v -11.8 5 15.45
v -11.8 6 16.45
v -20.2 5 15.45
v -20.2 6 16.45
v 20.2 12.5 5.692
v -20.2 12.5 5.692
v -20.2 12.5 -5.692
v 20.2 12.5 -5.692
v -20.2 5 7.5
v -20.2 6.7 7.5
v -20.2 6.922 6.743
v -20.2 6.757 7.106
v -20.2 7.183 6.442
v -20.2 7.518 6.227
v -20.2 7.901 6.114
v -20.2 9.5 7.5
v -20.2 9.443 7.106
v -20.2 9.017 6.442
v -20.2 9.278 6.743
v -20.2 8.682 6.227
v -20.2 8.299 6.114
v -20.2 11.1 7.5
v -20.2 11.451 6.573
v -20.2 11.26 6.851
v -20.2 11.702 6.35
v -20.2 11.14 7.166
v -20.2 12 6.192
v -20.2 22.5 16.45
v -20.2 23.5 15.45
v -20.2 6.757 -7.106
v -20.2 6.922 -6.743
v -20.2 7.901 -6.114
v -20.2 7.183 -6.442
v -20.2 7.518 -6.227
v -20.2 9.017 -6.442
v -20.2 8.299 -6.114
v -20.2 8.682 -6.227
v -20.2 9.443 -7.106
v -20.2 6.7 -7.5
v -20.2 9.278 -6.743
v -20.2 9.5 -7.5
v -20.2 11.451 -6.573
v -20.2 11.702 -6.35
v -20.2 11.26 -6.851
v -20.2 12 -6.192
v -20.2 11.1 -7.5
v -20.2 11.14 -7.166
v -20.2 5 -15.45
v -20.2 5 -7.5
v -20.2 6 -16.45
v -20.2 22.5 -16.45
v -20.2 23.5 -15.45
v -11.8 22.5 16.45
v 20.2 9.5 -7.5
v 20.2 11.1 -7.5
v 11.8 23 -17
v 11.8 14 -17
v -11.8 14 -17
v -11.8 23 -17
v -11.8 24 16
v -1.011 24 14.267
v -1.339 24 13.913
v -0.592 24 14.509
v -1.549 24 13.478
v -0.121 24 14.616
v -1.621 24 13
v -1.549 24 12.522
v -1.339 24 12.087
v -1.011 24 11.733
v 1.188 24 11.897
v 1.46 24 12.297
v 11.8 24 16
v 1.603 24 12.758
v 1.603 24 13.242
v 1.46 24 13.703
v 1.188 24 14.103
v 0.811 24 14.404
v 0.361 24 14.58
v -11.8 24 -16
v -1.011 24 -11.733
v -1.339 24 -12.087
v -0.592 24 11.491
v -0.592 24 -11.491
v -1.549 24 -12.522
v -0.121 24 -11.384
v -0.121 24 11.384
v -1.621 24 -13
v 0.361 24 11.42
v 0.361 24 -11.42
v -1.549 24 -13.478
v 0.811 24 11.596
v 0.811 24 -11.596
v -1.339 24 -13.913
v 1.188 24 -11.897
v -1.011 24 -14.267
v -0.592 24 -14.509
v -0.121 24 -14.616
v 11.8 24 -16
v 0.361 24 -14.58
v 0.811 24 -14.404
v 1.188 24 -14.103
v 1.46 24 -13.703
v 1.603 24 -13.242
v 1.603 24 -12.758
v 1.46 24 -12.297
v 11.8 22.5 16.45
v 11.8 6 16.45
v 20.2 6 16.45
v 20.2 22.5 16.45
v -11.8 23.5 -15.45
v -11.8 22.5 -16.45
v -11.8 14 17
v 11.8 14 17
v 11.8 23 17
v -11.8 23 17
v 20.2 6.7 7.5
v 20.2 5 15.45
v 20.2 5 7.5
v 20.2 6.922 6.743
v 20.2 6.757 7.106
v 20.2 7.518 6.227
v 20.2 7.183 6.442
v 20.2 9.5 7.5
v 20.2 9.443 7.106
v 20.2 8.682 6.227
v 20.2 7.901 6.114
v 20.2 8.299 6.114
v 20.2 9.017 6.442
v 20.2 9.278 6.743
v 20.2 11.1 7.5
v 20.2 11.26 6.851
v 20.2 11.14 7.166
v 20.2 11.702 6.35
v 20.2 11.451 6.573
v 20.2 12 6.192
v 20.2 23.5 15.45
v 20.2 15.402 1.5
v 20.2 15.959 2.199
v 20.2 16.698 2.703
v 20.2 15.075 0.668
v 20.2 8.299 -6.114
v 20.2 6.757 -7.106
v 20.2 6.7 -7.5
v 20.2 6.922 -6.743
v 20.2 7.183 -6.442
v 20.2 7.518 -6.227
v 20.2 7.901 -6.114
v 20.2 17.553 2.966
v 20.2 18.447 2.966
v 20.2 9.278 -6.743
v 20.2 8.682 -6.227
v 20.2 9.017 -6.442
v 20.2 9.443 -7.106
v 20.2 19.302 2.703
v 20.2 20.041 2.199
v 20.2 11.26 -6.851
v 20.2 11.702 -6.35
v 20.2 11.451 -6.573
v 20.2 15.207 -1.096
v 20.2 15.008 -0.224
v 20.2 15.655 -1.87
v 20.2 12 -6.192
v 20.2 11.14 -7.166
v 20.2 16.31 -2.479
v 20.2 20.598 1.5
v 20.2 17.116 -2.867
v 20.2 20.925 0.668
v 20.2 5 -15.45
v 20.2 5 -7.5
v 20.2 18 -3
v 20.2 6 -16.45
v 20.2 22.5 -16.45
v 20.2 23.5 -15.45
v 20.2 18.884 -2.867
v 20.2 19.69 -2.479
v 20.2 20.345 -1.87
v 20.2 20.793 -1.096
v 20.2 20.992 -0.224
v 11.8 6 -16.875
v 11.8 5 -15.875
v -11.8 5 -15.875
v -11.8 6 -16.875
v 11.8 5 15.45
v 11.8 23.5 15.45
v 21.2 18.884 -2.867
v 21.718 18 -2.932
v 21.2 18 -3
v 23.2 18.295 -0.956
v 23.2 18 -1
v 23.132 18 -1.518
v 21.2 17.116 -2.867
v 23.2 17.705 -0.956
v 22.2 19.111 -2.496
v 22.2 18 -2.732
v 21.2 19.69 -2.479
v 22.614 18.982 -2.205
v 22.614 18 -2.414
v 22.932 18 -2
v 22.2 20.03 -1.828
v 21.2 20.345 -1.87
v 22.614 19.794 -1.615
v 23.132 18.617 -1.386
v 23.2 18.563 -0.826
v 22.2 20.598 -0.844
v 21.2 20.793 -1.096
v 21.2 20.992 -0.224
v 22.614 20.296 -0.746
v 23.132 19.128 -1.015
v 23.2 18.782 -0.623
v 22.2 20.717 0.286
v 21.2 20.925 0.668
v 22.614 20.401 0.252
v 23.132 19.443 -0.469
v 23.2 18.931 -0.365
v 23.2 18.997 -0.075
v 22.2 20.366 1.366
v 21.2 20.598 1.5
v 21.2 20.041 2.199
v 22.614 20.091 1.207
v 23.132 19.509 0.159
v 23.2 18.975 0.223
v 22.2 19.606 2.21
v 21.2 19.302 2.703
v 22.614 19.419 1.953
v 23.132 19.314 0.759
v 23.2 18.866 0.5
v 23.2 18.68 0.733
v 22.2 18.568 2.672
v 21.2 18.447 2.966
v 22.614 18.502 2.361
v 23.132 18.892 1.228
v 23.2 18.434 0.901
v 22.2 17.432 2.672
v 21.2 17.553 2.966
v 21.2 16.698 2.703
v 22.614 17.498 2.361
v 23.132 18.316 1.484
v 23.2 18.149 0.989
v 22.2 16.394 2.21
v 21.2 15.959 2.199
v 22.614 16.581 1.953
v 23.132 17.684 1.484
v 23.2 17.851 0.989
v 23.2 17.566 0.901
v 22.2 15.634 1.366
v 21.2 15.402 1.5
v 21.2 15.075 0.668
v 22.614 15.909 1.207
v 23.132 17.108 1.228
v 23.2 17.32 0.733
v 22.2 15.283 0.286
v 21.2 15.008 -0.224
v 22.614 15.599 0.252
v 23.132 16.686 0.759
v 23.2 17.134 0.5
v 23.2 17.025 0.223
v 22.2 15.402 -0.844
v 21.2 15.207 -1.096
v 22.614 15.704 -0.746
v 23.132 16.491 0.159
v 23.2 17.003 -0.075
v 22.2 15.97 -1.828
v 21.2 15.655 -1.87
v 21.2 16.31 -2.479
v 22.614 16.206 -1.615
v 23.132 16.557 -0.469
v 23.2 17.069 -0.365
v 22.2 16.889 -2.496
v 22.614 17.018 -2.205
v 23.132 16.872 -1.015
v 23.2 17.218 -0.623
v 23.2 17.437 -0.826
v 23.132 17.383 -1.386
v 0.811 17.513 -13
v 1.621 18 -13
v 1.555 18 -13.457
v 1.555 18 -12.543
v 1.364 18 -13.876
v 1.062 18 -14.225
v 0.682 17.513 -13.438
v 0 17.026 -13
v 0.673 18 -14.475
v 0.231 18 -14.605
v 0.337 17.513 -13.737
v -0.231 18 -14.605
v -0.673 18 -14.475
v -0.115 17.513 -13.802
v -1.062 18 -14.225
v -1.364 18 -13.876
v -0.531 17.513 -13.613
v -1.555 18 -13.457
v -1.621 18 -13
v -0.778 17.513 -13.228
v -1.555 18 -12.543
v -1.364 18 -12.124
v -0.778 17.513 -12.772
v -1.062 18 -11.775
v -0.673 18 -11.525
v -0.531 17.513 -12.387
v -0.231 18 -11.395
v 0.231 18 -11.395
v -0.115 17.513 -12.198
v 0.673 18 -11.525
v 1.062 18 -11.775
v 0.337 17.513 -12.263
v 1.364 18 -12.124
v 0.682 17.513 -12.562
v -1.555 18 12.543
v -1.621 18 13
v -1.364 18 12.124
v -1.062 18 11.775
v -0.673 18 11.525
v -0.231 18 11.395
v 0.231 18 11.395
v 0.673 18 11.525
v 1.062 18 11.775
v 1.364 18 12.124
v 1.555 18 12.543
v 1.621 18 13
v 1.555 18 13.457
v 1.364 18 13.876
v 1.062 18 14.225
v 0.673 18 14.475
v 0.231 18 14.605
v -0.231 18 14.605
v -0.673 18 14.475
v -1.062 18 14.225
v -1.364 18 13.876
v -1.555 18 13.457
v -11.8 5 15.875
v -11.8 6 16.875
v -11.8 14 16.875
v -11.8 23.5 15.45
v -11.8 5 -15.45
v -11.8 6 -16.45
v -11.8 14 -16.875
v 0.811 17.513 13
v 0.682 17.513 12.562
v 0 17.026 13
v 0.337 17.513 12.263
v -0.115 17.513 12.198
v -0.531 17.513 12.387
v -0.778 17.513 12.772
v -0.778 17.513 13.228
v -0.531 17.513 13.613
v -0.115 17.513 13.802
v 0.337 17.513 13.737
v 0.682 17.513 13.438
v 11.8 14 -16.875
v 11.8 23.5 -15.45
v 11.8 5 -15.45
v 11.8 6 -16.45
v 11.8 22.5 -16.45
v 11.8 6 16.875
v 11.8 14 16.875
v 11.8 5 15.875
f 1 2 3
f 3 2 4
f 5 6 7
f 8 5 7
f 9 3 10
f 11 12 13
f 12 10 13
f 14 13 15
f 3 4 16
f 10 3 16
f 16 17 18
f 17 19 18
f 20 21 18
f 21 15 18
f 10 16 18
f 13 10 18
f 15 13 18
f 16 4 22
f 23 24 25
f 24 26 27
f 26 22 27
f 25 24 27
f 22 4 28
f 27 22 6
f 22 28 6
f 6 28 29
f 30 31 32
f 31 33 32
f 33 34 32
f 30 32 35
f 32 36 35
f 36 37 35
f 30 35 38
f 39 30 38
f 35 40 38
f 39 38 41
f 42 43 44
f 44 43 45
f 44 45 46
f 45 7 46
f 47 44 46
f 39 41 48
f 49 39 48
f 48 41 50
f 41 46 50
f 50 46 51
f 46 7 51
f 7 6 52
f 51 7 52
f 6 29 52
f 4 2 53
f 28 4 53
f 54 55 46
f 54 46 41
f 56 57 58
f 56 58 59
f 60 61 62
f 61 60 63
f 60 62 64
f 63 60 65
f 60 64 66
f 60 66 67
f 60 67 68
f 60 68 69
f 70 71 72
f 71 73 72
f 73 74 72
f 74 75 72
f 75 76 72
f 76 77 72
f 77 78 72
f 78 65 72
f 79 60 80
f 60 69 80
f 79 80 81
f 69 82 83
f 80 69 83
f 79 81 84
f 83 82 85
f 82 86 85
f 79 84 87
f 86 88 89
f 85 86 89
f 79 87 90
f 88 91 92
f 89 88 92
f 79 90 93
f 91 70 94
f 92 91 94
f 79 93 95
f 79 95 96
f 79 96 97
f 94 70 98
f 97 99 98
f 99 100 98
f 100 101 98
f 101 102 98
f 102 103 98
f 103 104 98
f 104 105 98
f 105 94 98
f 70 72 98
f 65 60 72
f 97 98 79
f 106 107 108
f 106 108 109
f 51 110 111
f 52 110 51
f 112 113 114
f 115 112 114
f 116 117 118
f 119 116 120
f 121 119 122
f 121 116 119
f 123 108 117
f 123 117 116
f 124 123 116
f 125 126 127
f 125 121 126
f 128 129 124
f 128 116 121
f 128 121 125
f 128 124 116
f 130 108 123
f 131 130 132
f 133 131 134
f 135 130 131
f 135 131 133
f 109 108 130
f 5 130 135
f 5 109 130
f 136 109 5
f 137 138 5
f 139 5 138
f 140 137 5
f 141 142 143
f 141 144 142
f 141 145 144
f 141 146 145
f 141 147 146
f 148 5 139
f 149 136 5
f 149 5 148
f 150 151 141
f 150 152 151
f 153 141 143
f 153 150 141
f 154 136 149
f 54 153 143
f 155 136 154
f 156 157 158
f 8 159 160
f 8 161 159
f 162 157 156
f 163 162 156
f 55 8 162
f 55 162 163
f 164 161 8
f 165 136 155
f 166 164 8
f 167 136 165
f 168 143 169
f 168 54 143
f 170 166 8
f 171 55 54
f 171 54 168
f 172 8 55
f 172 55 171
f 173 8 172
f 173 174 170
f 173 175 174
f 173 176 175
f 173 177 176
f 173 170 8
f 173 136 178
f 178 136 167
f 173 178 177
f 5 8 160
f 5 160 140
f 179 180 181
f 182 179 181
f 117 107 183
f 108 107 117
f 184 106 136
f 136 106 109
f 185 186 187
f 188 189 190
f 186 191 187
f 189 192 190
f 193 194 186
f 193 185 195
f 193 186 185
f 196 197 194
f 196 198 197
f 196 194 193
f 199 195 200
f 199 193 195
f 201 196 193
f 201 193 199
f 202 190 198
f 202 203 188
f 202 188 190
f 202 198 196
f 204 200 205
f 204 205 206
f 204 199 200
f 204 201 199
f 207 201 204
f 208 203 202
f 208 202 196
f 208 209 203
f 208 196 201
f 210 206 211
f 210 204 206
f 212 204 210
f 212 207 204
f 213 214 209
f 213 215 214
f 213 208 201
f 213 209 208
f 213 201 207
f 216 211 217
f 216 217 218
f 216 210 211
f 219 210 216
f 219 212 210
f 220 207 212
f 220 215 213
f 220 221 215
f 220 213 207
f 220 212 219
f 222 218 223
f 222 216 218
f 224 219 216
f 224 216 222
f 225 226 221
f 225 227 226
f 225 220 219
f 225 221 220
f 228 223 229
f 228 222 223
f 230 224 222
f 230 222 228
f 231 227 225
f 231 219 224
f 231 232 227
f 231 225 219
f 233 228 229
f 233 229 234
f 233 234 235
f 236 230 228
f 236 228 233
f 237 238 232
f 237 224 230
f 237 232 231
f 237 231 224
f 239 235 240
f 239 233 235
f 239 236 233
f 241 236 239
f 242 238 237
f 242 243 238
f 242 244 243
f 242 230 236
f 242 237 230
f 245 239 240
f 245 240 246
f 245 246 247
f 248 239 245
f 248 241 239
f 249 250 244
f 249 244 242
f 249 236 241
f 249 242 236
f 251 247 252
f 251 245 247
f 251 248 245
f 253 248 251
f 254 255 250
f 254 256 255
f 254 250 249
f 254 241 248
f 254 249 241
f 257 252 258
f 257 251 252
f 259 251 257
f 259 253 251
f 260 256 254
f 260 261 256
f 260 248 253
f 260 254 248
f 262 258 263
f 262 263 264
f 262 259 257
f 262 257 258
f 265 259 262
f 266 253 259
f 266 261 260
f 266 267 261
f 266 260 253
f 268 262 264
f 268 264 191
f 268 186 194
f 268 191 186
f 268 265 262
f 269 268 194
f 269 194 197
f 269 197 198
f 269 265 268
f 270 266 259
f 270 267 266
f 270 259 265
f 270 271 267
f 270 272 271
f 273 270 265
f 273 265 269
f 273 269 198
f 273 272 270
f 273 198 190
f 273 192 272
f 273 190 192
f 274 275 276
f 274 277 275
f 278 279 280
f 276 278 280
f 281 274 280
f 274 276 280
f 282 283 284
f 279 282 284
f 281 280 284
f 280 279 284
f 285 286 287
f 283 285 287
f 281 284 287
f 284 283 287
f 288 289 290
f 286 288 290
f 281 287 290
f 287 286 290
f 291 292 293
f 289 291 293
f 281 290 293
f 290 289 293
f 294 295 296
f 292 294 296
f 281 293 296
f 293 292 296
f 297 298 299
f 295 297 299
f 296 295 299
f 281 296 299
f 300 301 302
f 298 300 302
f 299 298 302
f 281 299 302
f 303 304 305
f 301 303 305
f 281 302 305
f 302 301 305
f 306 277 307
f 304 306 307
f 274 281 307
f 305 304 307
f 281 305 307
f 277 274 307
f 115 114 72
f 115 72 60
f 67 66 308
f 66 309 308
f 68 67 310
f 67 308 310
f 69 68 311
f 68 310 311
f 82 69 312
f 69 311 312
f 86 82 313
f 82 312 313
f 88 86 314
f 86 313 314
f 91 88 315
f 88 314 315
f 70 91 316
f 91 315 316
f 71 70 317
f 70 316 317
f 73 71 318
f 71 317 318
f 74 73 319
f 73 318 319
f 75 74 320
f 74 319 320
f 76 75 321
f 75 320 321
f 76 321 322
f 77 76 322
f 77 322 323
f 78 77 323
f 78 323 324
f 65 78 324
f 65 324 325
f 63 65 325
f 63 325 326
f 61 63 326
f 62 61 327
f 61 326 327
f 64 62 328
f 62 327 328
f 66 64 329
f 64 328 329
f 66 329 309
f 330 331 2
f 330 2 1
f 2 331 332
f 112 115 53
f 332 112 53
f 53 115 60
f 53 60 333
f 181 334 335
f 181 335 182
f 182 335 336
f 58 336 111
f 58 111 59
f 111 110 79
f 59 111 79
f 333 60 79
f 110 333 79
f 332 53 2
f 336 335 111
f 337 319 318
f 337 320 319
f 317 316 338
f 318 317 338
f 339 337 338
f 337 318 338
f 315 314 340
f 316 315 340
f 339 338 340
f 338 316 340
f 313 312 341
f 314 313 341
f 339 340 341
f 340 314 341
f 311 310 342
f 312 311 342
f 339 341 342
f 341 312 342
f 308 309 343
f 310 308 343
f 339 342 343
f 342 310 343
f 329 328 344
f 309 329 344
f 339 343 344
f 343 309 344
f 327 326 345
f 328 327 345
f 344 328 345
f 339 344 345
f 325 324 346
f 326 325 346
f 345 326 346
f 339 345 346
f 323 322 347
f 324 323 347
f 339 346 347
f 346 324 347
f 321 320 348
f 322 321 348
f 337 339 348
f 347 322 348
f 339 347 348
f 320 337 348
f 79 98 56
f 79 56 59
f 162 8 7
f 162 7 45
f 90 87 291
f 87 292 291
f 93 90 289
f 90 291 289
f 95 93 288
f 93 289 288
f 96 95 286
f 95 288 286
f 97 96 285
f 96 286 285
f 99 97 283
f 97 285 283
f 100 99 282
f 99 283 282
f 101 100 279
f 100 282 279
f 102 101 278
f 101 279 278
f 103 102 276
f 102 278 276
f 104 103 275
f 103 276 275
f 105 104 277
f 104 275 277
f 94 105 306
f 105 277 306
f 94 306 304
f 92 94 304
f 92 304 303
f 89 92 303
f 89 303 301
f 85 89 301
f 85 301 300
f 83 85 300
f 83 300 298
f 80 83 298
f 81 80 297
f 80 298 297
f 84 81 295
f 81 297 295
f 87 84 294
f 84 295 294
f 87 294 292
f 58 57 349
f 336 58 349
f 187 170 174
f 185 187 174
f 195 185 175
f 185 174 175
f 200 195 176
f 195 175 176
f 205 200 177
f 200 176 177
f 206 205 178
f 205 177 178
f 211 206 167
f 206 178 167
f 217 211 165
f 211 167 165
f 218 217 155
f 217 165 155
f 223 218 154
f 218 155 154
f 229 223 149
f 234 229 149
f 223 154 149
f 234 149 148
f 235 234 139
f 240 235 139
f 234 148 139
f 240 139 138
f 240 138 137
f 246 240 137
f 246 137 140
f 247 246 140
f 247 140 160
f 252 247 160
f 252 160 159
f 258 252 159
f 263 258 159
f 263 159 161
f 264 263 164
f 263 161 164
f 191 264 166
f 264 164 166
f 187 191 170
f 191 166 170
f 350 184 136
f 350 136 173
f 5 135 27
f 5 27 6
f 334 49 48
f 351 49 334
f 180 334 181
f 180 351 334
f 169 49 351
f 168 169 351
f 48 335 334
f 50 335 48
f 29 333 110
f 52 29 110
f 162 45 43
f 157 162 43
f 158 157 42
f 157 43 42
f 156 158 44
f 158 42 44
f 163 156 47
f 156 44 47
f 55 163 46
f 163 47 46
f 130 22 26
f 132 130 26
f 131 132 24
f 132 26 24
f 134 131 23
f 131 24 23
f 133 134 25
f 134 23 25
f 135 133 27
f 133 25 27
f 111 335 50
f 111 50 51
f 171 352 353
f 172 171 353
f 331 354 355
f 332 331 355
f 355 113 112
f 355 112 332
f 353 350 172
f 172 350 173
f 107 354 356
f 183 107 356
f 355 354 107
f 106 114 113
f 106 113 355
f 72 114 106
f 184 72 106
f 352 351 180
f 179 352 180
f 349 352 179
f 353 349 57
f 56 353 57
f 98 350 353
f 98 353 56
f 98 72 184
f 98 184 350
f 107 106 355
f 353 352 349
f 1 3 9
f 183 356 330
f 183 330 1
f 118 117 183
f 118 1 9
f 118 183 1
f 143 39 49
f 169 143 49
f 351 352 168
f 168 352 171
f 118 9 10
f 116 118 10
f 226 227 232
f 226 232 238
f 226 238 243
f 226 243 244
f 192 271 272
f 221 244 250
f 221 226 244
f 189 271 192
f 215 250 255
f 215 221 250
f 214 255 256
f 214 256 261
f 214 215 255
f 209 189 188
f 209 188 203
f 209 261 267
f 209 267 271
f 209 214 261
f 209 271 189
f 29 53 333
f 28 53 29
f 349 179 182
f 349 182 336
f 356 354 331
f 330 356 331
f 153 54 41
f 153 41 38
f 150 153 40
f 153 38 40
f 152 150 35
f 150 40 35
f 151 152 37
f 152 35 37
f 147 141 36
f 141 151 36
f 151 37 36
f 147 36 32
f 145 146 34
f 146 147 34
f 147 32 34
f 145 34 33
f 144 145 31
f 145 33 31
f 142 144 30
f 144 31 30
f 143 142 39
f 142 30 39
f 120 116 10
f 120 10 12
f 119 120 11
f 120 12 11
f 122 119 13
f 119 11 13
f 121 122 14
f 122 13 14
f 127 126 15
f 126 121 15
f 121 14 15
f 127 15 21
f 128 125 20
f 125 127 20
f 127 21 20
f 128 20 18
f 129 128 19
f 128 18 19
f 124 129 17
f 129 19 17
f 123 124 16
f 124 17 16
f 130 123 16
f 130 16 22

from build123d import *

# Parameters (mm, degrees)
SKETCH1_W               = 34
SKETCH1_H               = 19
BOSS_EXTRUDE1_DEPTH     = 20.2
SKETCH2_OUTSIDE_W       = 47.224
SKETCH2_OUTSIDE_H       = 32.224
SKETCH2_OUTSIDE_W_2     = 32.9
SKETCH2_OUTSIDE_H_2     = 18.5
CUT_EXTRUDE2_DEPTH      = 44.462627624
CUT_EXTRUDE8_DEPTH      = 36.679686097
CUT_EXTRUDE8_DEPTH_BACK = 36.679686097
SKETCH3_W               = 0.125
SKETCH3_H               = 9
CUT_EXTRUDE3_DEPTH      = 23.6
CHAMFER1_SIZE           = 1
CHAMFER2_SIZE           = 1
CHAMFER3_SIZE           = 1
CHAMFER4_SIZE           = 1
SKETCH10_R              = 3
BOSS_EXTRUDE3_DEPTH     = 3
FILLET1_R               = 2
TAP1_D                  = 3.242
TAP1_DEPTH              = 6
TAP1_TIP                = 0.973995063


with BuildPart() as part:
    # Sketch1 → Boss-Extrude1 (new, symmetric)
    with BuildSketch(Plane(origin=(0, 0, 0), x_dir=(0, 0, -1), z_dir=(1, 0, 0))):
        with Locations((0, 14.5)):
            Rectangle(SKETCH1_W, SKETCH1_H)
    extrude(amount=BOSS_EXTRUDE1_DEPTH, both=True)

    # Sketch2 outside → Cut-Extrude2 (cut, through all)
    with BuildSketch(Plane(origin=(11.8, 0, 0), x_dir=(0, 0, -1), z_dir=(1, 0, 0))):
        with Locations((0, 14.5)):
            Rectangle(SKETCH2_OUTSIDE_W, SKETCH2_OUTSIDE_H)
        with Locations((0, 14.25)):
            Rectangle(SKETCH2_OUTSIDE_W_2, SKETCH2_OUTSIDE_H_2, mode=Mode.SUBTRACT)
    cut_extrude2 = extrude(amount=CUT_EXTRUDE2_DEPTH, mode=Mode.SUBTRACT)

    # Mirror1: Cut-Extrude2 across plane
    add(cut_extrude2.mirror(Plane(origin=(0, 0, 0), x_dir=(0, 0, 1), z_dir=(1, 0, 0))), mode=Mode.SUBTRACT)

    # Sketch5 → Cut-Extrude8 (cut, two sides: drawn at the far end of the back side and taken through both)
    with BuildSketch(Plane(origin=(0, 0, 0), x_dir=(0, 0, -1), z_dir=(1, 0, 0)).offset(-CUT_EXTRUDE8_DEPTH_BACK)):
        with BuildLine():
            Line((-5.692330317, 12.5), (5.692330317, 12.5))
            Line((5.692330317, 12.5), (6.192330317, 12))
            ThreePointArc((6.192330317, 12), (6.706274607, 11.346743741), (7.5, 11.1))
            Line((7.5, 11.1), (7.5, 9.5))
            ThreePointArc((7.5, 9.5), (6.1, 8.1), (7.5, 6.7))
            Line((7.5, 6.7), (7.5, 1))
            Line((7.5, 1), (6.5, 0))
            Line((6.5, 0), (-6.5, 0))
            Line((-6.5, 0), (-7.5, 1))
            Line((-7.5, 1), (-7.5, 6.7))
            ThreePointArc((-7.5, 6.7), (-6.1, 8.1), (-7.5, 9.5))
            Line((-7.5, 9.5), (-7.5, 11.1))
            ThreePointArc((-7.5, 11.1), (-6.706274607, 11.346743741), (-6.192330317, 12))
            Line((-6.192330317, 12), (-5.692330317, 12.5))
        make_face()
    extrude(amount=CUT_EXTRUDE8_DEPTH + CUT_EXTRUDE8_DEPTH_BACK, mode=Mode.SUBTRACT)

    # Sketch3 → Cut-Extrude3 (cut)
    with BuildSketch(Plane(origin=(11.8, 0, 0), x_dir=(0, 0, -1), z_dir=(1, 0, 0))):
        with Locations((-16.9375, 9.5)):
            Rectangle(SKETCH3_W, SKETCH3_H)
    cut_extrude3 = extrude(amount=-CUT_EXTRUDE3_DEPTH, mode=Mode.SUBTRACT)

    # Mirror2: Cut-Extrude3 across plane
    add(cut_extrude3.mirror(Plane.XY), mode=Mode.SUBTRACT)

    # Chamfer1
    chamfer1_edges = [part.edges().sort_by_distance(p)[0] for p in [
        (16, 23.5, -16.45),
        (16, 23.5, 16.45),
        (-16, 23.5, 16.45),
        (-16, 23.5, -16.45),
    ]]
    chamfer(chamfer1_edges, length=CHAMFER1_SIZE)

    # Chamfer2
    chamfer2_edges = [part.edges().sort_by_distance(p)[0] for p in [
        (0, 24, 17),
        (0, 24, -17),
    ]]
    chamfer(chamfer2_edges, length=CHAMFER2_SIZE)

    # Chamfer3
    chamfer3_edges = [part.edges().sort_by_distance(p)[0] for p in [
        (16, 5, 16.45),
        (16, 5, -16.45),
        (-16, 5, -16.45),
        (-16, 5, 16.45),
    ]]
    chamfer(chamfer3_edges, length=CHAMFER3_SIZE)

    # Chamfer4
    chamfer4_edges = [part.edges().sort_by_distance(p)[0] for p in [
        (0, 5, 16.875),
        (0, 5, -16.875),
    ]]
    chamfer(chamfer4_edges, length=CHAMFER4_SIZE)

    # Sketch10 → Boss-Extrude3 (add)
    with BuildSketch(Plane(origin=(20.2, 0, 0), x_dir=(0, 0, -1), z_dir=(1, 0, 0))):
        with Locations((0, 18)):
            Circle(SKETCH10_R)
    extrude(amount=BOSS_EXTRUDE3_DEPTH)

    # Fillet1
    fillet1_edges = [part.edges().sort_by_distance(p)[0] for p in [
        (23.2, 18, 3),
    ]]
    fillet(fillet1_edges, radius=FILLET1_R)

    # Tap1
    with Locations(Plane(origin=(0, 24, 0), x_dir=(1, 0, 0), z_dir=(0, 1, 0))):
        with Locations((0, -13), (0, 13)):
            Hole(TAP1_D / 2, depth=TAP1_DEPTH)
            with Locations((0, 0, -(TAP1_DEPTH + TAP1_TIP / 2))):  # 118° drill point
                Cone(0, TAP1_D / 2, TAP1_TIP, mode=Mode.SUBTRACT)


solid = part.part
